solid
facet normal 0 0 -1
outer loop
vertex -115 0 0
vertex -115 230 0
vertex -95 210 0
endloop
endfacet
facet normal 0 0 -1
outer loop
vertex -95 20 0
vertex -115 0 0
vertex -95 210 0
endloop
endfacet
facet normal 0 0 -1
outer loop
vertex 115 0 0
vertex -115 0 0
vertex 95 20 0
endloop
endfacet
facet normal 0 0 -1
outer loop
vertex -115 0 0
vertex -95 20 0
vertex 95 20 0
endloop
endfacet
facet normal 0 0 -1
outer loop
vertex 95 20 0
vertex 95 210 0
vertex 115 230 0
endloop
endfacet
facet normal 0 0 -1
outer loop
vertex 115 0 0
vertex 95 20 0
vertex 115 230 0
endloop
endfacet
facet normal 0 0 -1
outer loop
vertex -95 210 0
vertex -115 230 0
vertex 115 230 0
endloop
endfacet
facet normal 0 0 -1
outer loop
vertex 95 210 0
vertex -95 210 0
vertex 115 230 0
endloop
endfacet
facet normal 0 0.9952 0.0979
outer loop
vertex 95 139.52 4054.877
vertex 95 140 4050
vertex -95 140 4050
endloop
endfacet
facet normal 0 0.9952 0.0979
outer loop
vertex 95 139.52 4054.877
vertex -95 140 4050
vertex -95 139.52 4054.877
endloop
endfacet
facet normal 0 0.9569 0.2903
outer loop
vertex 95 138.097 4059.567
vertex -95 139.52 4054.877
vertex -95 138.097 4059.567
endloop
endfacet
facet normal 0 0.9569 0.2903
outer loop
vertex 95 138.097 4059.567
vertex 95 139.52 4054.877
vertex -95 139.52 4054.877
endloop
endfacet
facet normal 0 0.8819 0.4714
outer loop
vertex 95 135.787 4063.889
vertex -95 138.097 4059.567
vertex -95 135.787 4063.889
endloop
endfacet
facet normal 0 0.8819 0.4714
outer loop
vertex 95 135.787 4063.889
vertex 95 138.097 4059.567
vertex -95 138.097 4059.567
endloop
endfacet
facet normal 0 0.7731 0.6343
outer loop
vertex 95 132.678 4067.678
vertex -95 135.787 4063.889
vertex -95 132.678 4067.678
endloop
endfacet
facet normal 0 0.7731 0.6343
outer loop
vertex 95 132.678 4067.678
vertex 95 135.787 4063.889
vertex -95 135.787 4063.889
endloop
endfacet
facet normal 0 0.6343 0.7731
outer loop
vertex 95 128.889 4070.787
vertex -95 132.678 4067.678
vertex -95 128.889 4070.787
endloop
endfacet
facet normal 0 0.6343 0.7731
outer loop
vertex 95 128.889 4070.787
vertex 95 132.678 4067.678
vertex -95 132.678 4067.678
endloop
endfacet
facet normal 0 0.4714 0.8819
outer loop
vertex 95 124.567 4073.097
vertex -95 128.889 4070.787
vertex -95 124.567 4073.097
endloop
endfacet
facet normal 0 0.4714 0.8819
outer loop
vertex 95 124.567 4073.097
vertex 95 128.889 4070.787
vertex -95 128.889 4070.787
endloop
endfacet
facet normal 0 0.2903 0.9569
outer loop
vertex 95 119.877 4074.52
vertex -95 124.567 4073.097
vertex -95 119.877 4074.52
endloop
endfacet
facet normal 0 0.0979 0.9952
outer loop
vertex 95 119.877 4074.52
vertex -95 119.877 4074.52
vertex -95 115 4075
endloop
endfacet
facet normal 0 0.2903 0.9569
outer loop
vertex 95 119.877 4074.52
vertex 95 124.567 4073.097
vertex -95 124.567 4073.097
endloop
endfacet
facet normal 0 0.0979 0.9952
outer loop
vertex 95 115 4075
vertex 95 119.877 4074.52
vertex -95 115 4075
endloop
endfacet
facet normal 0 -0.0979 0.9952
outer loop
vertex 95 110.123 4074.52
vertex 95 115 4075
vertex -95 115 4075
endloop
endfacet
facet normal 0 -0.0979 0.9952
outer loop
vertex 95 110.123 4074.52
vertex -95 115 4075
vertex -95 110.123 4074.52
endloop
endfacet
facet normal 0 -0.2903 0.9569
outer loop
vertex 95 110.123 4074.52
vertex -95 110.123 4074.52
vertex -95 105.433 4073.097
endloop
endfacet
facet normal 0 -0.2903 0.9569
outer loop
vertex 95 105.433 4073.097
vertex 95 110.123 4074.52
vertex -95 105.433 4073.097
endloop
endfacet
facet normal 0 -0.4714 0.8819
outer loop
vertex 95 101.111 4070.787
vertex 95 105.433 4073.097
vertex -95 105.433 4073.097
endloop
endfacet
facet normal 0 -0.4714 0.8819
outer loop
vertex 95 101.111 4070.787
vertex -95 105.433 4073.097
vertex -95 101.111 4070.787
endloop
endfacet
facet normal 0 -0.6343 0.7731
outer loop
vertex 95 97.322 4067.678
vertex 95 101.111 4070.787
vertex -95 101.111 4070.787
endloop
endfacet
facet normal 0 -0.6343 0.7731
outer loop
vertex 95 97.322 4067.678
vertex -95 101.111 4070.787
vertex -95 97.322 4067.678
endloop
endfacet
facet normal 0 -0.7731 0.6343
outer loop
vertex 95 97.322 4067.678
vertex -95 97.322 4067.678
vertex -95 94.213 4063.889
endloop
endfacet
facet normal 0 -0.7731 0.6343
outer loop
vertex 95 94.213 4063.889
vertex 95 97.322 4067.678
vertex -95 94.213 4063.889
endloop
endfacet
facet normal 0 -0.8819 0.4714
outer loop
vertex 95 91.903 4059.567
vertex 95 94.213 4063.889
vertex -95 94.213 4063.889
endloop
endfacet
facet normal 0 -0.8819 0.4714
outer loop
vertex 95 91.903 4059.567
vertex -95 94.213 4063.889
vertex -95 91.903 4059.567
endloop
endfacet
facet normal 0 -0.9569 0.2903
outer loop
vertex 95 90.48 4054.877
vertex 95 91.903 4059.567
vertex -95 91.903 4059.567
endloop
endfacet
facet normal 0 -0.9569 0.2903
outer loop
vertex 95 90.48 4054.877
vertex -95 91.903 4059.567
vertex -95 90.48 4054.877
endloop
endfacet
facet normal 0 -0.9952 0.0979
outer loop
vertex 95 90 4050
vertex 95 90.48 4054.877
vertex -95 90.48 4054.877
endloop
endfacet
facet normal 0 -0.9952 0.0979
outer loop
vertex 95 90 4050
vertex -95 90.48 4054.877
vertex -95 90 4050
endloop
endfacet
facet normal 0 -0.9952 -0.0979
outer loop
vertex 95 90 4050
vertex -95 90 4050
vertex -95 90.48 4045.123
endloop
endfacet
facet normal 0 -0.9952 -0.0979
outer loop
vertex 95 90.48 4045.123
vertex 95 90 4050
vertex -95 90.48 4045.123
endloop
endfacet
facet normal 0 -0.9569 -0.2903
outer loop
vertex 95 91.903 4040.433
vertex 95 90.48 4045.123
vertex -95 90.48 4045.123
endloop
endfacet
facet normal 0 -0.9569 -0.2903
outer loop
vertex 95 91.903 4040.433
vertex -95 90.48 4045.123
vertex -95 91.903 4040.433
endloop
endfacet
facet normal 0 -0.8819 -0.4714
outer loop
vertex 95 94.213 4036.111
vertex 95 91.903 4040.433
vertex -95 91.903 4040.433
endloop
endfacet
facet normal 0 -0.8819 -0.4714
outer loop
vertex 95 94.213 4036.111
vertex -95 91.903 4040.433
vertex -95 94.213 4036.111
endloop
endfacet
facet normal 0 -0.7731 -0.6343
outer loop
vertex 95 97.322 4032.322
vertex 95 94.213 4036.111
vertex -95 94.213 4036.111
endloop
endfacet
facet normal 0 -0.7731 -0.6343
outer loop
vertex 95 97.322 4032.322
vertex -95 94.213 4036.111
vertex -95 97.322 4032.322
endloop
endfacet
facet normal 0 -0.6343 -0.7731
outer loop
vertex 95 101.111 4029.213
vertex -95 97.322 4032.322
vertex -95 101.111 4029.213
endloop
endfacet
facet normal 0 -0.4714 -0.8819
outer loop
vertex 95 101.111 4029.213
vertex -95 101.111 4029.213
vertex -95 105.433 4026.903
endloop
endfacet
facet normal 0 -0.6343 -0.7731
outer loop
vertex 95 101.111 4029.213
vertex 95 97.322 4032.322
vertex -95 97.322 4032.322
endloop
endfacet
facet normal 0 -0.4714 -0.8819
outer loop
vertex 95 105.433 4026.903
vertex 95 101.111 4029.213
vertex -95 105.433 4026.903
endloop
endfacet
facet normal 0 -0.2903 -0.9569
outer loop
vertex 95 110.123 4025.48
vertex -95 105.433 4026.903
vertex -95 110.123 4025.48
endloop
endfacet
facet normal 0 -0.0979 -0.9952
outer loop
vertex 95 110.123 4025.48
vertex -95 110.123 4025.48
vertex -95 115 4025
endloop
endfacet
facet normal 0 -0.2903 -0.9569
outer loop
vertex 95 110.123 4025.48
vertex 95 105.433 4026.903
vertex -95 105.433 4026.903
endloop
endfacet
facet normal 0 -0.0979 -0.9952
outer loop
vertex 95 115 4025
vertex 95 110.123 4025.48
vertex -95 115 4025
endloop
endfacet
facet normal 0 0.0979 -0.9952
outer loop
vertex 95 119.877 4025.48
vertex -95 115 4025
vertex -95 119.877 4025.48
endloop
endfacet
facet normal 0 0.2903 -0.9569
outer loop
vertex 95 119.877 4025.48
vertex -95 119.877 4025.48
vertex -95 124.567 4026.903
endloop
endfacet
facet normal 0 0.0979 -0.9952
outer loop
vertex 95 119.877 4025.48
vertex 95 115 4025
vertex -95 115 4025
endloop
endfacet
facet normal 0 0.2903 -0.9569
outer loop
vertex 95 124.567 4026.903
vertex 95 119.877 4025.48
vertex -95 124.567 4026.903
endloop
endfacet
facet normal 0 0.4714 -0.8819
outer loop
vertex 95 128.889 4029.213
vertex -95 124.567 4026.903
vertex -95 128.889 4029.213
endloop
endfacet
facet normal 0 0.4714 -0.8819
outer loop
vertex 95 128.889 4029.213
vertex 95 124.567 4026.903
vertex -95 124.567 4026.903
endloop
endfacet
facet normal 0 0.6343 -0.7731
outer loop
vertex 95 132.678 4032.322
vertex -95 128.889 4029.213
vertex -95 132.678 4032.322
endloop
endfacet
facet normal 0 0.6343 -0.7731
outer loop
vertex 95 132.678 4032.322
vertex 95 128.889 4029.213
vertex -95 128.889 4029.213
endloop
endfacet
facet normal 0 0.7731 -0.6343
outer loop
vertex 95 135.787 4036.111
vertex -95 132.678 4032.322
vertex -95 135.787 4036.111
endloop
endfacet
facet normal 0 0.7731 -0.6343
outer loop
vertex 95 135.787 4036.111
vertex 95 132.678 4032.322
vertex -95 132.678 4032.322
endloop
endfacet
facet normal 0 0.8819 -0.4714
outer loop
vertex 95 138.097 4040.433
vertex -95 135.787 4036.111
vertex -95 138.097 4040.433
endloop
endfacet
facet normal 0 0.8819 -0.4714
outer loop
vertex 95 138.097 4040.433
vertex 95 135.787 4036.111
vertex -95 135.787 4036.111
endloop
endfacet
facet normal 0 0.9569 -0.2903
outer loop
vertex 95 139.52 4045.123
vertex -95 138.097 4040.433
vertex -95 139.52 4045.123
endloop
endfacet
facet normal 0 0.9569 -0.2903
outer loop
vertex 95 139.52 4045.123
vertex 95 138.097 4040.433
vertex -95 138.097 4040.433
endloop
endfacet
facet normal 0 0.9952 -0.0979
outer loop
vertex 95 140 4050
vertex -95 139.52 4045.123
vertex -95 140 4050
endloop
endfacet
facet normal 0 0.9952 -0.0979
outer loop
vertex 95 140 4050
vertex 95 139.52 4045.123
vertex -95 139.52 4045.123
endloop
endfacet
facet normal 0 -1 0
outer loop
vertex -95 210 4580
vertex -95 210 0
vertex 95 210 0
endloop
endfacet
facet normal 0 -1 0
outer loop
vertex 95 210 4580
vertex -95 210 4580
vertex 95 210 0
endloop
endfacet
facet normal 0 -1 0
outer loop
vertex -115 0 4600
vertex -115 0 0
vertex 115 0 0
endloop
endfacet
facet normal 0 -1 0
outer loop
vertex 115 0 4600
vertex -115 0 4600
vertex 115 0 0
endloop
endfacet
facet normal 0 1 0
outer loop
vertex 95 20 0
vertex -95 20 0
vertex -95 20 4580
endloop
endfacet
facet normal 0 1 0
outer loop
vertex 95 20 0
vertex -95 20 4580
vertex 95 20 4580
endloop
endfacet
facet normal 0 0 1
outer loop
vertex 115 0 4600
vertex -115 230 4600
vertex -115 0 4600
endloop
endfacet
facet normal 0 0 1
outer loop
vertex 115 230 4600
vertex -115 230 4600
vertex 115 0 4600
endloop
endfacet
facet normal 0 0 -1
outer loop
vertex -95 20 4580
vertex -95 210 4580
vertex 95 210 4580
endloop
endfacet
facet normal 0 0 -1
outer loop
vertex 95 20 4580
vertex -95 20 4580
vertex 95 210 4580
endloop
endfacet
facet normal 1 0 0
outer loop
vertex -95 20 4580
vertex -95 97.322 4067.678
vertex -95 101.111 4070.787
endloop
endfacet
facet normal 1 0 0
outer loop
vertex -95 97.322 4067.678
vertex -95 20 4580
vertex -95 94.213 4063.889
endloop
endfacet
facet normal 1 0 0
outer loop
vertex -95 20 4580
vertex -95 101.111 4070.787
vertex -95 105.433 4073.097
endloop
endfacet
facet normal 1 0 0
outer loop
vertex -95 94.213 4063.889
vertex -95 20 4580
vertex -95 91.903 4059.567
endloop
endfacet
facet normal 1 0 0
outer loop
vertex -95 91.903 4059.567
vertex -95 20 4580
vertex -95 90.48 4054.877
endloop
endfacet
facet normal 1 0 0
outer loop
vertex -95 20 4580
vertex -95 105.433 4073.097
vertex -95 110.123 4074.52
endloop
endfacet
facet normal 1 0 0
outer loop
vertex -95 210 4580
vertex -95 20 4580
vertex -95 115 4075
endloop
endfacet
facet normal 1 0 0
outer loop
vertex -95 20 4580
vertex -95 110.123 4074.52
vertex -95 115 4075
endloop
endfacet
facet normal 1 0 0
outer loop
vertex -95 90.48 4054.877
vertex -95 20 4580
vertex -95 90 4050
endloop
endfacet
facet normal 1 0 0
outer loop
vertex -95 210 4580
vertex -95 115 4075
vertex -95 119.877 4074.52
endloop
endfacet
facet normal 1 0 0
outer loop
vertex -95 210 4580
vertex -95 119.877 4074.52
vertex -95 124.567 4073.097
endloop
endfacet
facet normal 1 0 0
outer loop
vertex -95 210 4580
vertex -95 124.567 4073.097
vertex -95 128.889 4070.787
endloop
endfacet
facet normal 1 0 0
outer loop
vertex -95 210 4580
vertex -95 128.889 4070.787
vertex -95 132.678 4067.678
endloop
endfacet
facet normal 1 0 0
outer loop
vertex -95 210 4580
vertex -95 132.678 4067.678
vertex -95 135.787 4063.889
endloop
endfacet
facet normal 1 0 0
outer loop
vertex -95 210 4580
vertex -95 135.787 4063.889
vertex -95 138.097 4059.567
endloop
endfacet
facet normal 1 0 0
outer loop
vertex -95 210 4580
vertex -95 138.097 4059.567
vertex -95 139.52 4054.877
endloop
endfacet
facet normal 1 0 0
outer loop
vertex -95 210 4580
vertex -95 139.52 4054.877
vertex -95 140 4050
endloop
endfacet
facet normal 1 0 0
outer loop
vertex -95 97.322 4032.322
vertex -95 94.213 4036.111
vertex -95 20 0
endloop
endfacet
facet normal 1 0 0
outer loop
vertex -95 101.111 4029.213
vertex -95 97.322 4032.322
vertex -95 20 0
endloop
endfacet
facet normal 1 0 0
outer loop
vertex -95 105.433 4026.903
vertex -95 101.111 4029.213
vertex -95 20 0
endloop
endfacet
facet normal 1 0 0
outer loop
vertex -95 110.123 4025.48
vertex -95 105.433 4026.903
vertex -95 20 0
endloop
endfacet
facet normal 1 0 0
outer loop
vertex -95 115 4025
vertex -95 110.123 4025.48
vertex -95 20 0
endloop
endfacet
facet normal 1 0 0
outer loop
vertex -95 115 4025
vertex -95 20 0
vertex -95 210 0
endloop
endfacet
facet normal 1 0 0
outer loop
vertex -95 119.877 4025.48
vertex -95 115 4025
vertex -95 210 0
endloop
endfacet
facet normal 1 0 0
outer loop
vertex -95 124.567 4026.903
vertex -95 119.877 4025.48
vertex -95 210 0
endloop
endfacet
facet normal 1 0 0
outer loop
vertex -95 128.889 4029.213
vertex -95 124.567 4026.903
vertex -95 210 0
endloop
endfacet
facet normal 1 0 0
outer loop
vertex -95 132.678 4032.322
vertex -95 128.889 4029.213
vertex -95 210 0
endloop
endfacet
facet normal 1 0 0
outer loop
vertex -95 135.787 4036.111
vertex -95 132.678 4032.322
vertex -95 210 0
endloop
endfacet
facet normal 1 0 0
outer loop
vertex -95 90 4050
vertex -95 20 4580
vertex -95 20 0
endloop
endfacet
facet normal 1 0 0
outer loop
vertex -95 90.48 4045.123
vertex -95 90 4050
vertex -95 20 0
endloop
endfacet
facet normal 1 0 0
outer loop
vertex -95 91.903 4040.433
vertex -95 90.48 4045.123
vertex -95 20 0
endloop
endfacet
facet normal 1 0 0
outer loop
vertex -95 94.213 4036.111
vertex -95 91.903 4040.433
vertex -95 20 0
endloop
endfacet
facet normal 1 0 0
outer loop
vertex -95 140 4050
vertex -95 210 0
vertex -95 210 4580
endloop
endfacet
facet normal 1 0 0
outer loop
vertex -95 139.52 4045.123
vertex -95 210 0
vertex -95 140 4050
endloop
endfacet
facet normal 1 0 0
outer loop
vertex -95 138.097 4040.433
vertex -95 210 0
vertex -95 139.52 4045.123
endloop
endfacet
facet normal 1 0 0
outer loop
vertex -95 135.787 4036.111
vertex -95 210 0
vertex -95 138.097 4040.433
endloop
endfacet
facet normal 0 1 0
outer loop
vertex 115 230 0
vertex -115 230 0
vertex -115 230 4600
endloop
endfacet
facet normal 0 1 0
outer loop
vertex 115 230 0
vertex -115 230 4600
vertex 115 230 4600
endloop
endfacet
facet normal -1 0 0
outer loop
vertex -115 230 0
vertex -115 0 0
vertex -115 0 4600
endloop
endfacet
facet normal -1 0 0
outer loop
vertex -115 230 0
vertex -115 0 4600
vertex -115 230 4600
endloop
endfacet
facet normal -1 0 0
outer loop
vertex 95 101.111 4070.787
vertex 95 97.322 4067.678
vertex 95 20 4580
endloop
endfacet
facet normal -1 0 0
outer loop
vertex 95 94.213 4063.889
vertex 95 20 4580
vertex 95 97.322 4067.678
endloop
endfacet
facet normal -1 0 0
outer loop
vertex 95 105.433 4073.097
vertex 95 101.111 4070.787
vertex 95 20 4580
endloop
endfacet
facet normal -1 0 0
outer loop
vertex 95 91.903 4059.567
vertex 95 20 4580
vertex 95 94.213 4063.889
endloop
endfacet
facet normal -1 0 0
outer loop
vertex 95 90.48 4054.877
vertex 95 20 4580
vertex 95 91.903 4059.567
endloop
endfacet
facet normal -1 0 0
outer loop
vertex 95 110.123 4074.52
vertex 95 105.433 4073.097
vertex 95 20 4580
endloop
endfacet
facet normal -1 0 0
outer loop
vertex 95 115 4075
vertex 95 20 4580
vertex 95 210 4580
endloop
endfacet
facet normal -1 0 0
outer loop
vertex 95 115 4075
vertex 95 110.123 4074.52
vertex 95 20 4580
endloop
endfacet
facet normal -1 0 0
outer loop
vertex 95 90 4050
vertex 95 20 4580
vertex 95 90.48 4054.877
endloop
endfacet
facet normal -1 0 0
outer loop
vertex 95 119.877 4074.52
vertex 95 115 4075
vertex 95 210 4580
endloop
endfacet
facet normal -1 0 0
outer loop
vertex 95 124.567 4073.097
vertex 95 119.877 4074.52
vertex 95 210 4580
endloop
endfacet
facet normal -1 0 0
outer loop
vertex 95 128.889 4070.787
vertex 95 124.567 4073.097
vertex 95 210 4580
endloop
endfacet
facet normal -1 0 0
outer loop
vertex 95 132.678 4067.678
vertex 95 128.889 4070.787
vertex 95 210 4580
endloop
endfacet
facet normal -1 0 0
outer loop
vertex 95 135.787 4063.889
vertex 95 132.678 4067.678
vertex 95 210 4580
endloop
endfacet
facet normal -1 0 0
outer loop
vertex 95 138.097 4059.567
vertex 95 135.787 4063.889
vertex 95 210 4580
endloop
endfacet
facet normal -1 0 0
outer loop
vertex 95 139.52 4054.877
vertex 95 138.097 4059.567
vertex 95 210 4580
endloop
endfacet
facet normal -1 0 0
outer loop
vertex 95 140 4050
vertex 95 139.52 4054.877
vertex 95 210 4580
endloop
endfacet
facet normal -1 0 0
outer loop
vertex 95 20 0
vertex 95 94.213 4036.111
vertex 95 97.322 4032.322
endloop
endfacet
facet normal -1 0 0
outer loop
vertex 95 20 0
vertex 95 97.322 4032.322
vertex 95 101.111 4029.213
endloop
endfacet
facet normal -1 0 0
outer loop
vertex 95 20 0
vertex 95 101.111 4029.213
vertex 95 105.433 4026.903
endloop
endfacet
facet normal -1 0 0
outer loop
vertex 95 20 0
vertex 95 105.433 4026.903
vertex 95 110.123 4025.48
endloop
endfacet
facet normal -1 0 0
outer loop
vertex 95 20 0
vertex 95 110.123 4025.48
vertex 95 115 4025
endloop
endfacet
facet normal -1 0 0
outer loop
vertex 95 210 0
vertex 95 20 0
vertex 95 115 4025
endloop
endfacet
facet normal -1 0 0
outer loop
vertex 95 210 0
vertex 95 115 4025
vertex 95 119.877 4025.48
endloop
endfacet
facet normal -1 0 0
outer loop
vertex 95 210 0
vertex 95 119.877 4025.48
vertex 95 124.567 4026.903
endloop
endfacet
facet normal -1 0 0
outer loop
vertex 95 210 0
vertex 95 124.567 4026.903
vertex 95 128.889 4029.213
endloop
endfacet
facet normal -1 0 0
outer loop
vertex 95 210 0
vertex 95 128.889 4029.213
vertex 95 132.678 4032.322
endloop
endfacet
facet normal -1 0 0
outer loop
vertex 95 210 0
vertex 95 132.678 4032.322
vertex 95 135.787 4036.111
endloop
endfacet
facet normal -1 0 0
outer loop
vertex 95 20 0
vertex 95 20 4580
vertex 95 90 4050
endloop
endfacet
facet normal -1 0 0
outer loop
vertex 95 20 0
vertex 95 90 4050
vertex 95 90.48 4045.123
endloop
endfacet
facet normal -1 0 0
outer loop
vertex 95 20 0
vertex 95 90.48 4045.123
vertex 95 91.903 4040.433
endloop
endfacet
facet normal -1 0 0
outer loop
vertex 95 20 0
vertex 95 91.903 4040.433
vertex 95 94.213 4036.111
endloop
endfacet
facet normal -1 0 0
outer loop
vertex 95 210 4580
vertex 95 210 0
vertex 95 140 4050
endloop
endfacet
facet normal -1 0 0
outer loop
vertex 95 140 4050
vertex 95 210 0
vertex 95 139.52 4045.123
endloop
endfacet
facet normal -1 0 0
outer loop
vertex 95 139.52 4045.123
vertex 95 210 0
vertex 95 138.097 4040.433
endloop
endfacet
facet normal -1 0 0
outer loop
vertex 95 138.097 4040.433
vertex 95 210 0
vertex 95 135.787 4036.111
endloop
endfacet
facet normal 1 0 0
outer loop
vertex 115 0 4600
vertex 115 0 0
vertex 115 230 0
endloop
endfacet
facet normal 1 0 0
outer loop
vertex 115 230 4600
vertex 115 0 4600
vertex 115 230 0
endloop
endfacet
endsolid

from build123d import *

# Parameters (mm, degrees)
SKETCH1_W           = 230
SKETCH1_H           = 230
BOSS_EXTRUDE1_DEPTH = 4600
SHELL1_T            = -20
BOSS_EXTRUDE2_REACH = 4613.486
SKETCH2_R           = 25


with BuildPart() as part:
    # Sketch1 → Boss-Extrude1 (new body)
    with BuildSketch(Plane.XY):
        with Locations((0, 115)):
            Rectangle(SKETCH1_W, SKETCH1_H)
    extrude(amount=BOSS_EXTRUDE1_DEPTH)

    # Shell1
    shell1_openings = [part.faces().sort_by_distance(p)[0] for p in [
        (0, 115, 0),
    ]]
    offset(amount=SHELL1_T, openings=shell1_openings, kind=Kind.INTERSECTION)

    # Sketch2 → Boss-Extrude2 (add, up to next)
    with BuildSketch(Plane(origin=(115, 0, 0), x_dir=(0, 0, -1), z_dir=(1, 0, 0)), mode=Mode.PRIVATE) as boss_extrude2_sk1:
        with Locations(Location((-4050, 115, 0), (0, 0, 90))):
            Circle(SKETCH2_R)
    boss_extrude2_tool1 = extrude(boss_extrude2_sk1.sketch, amount=-BOSS_EXTRUDE2_REACH, mode=Mode.PRIVATE) - part.part
    add(boss_extrude2_tool1.solids().sort_by_distance((115, 115, 4050))[0])


solid = part.part
